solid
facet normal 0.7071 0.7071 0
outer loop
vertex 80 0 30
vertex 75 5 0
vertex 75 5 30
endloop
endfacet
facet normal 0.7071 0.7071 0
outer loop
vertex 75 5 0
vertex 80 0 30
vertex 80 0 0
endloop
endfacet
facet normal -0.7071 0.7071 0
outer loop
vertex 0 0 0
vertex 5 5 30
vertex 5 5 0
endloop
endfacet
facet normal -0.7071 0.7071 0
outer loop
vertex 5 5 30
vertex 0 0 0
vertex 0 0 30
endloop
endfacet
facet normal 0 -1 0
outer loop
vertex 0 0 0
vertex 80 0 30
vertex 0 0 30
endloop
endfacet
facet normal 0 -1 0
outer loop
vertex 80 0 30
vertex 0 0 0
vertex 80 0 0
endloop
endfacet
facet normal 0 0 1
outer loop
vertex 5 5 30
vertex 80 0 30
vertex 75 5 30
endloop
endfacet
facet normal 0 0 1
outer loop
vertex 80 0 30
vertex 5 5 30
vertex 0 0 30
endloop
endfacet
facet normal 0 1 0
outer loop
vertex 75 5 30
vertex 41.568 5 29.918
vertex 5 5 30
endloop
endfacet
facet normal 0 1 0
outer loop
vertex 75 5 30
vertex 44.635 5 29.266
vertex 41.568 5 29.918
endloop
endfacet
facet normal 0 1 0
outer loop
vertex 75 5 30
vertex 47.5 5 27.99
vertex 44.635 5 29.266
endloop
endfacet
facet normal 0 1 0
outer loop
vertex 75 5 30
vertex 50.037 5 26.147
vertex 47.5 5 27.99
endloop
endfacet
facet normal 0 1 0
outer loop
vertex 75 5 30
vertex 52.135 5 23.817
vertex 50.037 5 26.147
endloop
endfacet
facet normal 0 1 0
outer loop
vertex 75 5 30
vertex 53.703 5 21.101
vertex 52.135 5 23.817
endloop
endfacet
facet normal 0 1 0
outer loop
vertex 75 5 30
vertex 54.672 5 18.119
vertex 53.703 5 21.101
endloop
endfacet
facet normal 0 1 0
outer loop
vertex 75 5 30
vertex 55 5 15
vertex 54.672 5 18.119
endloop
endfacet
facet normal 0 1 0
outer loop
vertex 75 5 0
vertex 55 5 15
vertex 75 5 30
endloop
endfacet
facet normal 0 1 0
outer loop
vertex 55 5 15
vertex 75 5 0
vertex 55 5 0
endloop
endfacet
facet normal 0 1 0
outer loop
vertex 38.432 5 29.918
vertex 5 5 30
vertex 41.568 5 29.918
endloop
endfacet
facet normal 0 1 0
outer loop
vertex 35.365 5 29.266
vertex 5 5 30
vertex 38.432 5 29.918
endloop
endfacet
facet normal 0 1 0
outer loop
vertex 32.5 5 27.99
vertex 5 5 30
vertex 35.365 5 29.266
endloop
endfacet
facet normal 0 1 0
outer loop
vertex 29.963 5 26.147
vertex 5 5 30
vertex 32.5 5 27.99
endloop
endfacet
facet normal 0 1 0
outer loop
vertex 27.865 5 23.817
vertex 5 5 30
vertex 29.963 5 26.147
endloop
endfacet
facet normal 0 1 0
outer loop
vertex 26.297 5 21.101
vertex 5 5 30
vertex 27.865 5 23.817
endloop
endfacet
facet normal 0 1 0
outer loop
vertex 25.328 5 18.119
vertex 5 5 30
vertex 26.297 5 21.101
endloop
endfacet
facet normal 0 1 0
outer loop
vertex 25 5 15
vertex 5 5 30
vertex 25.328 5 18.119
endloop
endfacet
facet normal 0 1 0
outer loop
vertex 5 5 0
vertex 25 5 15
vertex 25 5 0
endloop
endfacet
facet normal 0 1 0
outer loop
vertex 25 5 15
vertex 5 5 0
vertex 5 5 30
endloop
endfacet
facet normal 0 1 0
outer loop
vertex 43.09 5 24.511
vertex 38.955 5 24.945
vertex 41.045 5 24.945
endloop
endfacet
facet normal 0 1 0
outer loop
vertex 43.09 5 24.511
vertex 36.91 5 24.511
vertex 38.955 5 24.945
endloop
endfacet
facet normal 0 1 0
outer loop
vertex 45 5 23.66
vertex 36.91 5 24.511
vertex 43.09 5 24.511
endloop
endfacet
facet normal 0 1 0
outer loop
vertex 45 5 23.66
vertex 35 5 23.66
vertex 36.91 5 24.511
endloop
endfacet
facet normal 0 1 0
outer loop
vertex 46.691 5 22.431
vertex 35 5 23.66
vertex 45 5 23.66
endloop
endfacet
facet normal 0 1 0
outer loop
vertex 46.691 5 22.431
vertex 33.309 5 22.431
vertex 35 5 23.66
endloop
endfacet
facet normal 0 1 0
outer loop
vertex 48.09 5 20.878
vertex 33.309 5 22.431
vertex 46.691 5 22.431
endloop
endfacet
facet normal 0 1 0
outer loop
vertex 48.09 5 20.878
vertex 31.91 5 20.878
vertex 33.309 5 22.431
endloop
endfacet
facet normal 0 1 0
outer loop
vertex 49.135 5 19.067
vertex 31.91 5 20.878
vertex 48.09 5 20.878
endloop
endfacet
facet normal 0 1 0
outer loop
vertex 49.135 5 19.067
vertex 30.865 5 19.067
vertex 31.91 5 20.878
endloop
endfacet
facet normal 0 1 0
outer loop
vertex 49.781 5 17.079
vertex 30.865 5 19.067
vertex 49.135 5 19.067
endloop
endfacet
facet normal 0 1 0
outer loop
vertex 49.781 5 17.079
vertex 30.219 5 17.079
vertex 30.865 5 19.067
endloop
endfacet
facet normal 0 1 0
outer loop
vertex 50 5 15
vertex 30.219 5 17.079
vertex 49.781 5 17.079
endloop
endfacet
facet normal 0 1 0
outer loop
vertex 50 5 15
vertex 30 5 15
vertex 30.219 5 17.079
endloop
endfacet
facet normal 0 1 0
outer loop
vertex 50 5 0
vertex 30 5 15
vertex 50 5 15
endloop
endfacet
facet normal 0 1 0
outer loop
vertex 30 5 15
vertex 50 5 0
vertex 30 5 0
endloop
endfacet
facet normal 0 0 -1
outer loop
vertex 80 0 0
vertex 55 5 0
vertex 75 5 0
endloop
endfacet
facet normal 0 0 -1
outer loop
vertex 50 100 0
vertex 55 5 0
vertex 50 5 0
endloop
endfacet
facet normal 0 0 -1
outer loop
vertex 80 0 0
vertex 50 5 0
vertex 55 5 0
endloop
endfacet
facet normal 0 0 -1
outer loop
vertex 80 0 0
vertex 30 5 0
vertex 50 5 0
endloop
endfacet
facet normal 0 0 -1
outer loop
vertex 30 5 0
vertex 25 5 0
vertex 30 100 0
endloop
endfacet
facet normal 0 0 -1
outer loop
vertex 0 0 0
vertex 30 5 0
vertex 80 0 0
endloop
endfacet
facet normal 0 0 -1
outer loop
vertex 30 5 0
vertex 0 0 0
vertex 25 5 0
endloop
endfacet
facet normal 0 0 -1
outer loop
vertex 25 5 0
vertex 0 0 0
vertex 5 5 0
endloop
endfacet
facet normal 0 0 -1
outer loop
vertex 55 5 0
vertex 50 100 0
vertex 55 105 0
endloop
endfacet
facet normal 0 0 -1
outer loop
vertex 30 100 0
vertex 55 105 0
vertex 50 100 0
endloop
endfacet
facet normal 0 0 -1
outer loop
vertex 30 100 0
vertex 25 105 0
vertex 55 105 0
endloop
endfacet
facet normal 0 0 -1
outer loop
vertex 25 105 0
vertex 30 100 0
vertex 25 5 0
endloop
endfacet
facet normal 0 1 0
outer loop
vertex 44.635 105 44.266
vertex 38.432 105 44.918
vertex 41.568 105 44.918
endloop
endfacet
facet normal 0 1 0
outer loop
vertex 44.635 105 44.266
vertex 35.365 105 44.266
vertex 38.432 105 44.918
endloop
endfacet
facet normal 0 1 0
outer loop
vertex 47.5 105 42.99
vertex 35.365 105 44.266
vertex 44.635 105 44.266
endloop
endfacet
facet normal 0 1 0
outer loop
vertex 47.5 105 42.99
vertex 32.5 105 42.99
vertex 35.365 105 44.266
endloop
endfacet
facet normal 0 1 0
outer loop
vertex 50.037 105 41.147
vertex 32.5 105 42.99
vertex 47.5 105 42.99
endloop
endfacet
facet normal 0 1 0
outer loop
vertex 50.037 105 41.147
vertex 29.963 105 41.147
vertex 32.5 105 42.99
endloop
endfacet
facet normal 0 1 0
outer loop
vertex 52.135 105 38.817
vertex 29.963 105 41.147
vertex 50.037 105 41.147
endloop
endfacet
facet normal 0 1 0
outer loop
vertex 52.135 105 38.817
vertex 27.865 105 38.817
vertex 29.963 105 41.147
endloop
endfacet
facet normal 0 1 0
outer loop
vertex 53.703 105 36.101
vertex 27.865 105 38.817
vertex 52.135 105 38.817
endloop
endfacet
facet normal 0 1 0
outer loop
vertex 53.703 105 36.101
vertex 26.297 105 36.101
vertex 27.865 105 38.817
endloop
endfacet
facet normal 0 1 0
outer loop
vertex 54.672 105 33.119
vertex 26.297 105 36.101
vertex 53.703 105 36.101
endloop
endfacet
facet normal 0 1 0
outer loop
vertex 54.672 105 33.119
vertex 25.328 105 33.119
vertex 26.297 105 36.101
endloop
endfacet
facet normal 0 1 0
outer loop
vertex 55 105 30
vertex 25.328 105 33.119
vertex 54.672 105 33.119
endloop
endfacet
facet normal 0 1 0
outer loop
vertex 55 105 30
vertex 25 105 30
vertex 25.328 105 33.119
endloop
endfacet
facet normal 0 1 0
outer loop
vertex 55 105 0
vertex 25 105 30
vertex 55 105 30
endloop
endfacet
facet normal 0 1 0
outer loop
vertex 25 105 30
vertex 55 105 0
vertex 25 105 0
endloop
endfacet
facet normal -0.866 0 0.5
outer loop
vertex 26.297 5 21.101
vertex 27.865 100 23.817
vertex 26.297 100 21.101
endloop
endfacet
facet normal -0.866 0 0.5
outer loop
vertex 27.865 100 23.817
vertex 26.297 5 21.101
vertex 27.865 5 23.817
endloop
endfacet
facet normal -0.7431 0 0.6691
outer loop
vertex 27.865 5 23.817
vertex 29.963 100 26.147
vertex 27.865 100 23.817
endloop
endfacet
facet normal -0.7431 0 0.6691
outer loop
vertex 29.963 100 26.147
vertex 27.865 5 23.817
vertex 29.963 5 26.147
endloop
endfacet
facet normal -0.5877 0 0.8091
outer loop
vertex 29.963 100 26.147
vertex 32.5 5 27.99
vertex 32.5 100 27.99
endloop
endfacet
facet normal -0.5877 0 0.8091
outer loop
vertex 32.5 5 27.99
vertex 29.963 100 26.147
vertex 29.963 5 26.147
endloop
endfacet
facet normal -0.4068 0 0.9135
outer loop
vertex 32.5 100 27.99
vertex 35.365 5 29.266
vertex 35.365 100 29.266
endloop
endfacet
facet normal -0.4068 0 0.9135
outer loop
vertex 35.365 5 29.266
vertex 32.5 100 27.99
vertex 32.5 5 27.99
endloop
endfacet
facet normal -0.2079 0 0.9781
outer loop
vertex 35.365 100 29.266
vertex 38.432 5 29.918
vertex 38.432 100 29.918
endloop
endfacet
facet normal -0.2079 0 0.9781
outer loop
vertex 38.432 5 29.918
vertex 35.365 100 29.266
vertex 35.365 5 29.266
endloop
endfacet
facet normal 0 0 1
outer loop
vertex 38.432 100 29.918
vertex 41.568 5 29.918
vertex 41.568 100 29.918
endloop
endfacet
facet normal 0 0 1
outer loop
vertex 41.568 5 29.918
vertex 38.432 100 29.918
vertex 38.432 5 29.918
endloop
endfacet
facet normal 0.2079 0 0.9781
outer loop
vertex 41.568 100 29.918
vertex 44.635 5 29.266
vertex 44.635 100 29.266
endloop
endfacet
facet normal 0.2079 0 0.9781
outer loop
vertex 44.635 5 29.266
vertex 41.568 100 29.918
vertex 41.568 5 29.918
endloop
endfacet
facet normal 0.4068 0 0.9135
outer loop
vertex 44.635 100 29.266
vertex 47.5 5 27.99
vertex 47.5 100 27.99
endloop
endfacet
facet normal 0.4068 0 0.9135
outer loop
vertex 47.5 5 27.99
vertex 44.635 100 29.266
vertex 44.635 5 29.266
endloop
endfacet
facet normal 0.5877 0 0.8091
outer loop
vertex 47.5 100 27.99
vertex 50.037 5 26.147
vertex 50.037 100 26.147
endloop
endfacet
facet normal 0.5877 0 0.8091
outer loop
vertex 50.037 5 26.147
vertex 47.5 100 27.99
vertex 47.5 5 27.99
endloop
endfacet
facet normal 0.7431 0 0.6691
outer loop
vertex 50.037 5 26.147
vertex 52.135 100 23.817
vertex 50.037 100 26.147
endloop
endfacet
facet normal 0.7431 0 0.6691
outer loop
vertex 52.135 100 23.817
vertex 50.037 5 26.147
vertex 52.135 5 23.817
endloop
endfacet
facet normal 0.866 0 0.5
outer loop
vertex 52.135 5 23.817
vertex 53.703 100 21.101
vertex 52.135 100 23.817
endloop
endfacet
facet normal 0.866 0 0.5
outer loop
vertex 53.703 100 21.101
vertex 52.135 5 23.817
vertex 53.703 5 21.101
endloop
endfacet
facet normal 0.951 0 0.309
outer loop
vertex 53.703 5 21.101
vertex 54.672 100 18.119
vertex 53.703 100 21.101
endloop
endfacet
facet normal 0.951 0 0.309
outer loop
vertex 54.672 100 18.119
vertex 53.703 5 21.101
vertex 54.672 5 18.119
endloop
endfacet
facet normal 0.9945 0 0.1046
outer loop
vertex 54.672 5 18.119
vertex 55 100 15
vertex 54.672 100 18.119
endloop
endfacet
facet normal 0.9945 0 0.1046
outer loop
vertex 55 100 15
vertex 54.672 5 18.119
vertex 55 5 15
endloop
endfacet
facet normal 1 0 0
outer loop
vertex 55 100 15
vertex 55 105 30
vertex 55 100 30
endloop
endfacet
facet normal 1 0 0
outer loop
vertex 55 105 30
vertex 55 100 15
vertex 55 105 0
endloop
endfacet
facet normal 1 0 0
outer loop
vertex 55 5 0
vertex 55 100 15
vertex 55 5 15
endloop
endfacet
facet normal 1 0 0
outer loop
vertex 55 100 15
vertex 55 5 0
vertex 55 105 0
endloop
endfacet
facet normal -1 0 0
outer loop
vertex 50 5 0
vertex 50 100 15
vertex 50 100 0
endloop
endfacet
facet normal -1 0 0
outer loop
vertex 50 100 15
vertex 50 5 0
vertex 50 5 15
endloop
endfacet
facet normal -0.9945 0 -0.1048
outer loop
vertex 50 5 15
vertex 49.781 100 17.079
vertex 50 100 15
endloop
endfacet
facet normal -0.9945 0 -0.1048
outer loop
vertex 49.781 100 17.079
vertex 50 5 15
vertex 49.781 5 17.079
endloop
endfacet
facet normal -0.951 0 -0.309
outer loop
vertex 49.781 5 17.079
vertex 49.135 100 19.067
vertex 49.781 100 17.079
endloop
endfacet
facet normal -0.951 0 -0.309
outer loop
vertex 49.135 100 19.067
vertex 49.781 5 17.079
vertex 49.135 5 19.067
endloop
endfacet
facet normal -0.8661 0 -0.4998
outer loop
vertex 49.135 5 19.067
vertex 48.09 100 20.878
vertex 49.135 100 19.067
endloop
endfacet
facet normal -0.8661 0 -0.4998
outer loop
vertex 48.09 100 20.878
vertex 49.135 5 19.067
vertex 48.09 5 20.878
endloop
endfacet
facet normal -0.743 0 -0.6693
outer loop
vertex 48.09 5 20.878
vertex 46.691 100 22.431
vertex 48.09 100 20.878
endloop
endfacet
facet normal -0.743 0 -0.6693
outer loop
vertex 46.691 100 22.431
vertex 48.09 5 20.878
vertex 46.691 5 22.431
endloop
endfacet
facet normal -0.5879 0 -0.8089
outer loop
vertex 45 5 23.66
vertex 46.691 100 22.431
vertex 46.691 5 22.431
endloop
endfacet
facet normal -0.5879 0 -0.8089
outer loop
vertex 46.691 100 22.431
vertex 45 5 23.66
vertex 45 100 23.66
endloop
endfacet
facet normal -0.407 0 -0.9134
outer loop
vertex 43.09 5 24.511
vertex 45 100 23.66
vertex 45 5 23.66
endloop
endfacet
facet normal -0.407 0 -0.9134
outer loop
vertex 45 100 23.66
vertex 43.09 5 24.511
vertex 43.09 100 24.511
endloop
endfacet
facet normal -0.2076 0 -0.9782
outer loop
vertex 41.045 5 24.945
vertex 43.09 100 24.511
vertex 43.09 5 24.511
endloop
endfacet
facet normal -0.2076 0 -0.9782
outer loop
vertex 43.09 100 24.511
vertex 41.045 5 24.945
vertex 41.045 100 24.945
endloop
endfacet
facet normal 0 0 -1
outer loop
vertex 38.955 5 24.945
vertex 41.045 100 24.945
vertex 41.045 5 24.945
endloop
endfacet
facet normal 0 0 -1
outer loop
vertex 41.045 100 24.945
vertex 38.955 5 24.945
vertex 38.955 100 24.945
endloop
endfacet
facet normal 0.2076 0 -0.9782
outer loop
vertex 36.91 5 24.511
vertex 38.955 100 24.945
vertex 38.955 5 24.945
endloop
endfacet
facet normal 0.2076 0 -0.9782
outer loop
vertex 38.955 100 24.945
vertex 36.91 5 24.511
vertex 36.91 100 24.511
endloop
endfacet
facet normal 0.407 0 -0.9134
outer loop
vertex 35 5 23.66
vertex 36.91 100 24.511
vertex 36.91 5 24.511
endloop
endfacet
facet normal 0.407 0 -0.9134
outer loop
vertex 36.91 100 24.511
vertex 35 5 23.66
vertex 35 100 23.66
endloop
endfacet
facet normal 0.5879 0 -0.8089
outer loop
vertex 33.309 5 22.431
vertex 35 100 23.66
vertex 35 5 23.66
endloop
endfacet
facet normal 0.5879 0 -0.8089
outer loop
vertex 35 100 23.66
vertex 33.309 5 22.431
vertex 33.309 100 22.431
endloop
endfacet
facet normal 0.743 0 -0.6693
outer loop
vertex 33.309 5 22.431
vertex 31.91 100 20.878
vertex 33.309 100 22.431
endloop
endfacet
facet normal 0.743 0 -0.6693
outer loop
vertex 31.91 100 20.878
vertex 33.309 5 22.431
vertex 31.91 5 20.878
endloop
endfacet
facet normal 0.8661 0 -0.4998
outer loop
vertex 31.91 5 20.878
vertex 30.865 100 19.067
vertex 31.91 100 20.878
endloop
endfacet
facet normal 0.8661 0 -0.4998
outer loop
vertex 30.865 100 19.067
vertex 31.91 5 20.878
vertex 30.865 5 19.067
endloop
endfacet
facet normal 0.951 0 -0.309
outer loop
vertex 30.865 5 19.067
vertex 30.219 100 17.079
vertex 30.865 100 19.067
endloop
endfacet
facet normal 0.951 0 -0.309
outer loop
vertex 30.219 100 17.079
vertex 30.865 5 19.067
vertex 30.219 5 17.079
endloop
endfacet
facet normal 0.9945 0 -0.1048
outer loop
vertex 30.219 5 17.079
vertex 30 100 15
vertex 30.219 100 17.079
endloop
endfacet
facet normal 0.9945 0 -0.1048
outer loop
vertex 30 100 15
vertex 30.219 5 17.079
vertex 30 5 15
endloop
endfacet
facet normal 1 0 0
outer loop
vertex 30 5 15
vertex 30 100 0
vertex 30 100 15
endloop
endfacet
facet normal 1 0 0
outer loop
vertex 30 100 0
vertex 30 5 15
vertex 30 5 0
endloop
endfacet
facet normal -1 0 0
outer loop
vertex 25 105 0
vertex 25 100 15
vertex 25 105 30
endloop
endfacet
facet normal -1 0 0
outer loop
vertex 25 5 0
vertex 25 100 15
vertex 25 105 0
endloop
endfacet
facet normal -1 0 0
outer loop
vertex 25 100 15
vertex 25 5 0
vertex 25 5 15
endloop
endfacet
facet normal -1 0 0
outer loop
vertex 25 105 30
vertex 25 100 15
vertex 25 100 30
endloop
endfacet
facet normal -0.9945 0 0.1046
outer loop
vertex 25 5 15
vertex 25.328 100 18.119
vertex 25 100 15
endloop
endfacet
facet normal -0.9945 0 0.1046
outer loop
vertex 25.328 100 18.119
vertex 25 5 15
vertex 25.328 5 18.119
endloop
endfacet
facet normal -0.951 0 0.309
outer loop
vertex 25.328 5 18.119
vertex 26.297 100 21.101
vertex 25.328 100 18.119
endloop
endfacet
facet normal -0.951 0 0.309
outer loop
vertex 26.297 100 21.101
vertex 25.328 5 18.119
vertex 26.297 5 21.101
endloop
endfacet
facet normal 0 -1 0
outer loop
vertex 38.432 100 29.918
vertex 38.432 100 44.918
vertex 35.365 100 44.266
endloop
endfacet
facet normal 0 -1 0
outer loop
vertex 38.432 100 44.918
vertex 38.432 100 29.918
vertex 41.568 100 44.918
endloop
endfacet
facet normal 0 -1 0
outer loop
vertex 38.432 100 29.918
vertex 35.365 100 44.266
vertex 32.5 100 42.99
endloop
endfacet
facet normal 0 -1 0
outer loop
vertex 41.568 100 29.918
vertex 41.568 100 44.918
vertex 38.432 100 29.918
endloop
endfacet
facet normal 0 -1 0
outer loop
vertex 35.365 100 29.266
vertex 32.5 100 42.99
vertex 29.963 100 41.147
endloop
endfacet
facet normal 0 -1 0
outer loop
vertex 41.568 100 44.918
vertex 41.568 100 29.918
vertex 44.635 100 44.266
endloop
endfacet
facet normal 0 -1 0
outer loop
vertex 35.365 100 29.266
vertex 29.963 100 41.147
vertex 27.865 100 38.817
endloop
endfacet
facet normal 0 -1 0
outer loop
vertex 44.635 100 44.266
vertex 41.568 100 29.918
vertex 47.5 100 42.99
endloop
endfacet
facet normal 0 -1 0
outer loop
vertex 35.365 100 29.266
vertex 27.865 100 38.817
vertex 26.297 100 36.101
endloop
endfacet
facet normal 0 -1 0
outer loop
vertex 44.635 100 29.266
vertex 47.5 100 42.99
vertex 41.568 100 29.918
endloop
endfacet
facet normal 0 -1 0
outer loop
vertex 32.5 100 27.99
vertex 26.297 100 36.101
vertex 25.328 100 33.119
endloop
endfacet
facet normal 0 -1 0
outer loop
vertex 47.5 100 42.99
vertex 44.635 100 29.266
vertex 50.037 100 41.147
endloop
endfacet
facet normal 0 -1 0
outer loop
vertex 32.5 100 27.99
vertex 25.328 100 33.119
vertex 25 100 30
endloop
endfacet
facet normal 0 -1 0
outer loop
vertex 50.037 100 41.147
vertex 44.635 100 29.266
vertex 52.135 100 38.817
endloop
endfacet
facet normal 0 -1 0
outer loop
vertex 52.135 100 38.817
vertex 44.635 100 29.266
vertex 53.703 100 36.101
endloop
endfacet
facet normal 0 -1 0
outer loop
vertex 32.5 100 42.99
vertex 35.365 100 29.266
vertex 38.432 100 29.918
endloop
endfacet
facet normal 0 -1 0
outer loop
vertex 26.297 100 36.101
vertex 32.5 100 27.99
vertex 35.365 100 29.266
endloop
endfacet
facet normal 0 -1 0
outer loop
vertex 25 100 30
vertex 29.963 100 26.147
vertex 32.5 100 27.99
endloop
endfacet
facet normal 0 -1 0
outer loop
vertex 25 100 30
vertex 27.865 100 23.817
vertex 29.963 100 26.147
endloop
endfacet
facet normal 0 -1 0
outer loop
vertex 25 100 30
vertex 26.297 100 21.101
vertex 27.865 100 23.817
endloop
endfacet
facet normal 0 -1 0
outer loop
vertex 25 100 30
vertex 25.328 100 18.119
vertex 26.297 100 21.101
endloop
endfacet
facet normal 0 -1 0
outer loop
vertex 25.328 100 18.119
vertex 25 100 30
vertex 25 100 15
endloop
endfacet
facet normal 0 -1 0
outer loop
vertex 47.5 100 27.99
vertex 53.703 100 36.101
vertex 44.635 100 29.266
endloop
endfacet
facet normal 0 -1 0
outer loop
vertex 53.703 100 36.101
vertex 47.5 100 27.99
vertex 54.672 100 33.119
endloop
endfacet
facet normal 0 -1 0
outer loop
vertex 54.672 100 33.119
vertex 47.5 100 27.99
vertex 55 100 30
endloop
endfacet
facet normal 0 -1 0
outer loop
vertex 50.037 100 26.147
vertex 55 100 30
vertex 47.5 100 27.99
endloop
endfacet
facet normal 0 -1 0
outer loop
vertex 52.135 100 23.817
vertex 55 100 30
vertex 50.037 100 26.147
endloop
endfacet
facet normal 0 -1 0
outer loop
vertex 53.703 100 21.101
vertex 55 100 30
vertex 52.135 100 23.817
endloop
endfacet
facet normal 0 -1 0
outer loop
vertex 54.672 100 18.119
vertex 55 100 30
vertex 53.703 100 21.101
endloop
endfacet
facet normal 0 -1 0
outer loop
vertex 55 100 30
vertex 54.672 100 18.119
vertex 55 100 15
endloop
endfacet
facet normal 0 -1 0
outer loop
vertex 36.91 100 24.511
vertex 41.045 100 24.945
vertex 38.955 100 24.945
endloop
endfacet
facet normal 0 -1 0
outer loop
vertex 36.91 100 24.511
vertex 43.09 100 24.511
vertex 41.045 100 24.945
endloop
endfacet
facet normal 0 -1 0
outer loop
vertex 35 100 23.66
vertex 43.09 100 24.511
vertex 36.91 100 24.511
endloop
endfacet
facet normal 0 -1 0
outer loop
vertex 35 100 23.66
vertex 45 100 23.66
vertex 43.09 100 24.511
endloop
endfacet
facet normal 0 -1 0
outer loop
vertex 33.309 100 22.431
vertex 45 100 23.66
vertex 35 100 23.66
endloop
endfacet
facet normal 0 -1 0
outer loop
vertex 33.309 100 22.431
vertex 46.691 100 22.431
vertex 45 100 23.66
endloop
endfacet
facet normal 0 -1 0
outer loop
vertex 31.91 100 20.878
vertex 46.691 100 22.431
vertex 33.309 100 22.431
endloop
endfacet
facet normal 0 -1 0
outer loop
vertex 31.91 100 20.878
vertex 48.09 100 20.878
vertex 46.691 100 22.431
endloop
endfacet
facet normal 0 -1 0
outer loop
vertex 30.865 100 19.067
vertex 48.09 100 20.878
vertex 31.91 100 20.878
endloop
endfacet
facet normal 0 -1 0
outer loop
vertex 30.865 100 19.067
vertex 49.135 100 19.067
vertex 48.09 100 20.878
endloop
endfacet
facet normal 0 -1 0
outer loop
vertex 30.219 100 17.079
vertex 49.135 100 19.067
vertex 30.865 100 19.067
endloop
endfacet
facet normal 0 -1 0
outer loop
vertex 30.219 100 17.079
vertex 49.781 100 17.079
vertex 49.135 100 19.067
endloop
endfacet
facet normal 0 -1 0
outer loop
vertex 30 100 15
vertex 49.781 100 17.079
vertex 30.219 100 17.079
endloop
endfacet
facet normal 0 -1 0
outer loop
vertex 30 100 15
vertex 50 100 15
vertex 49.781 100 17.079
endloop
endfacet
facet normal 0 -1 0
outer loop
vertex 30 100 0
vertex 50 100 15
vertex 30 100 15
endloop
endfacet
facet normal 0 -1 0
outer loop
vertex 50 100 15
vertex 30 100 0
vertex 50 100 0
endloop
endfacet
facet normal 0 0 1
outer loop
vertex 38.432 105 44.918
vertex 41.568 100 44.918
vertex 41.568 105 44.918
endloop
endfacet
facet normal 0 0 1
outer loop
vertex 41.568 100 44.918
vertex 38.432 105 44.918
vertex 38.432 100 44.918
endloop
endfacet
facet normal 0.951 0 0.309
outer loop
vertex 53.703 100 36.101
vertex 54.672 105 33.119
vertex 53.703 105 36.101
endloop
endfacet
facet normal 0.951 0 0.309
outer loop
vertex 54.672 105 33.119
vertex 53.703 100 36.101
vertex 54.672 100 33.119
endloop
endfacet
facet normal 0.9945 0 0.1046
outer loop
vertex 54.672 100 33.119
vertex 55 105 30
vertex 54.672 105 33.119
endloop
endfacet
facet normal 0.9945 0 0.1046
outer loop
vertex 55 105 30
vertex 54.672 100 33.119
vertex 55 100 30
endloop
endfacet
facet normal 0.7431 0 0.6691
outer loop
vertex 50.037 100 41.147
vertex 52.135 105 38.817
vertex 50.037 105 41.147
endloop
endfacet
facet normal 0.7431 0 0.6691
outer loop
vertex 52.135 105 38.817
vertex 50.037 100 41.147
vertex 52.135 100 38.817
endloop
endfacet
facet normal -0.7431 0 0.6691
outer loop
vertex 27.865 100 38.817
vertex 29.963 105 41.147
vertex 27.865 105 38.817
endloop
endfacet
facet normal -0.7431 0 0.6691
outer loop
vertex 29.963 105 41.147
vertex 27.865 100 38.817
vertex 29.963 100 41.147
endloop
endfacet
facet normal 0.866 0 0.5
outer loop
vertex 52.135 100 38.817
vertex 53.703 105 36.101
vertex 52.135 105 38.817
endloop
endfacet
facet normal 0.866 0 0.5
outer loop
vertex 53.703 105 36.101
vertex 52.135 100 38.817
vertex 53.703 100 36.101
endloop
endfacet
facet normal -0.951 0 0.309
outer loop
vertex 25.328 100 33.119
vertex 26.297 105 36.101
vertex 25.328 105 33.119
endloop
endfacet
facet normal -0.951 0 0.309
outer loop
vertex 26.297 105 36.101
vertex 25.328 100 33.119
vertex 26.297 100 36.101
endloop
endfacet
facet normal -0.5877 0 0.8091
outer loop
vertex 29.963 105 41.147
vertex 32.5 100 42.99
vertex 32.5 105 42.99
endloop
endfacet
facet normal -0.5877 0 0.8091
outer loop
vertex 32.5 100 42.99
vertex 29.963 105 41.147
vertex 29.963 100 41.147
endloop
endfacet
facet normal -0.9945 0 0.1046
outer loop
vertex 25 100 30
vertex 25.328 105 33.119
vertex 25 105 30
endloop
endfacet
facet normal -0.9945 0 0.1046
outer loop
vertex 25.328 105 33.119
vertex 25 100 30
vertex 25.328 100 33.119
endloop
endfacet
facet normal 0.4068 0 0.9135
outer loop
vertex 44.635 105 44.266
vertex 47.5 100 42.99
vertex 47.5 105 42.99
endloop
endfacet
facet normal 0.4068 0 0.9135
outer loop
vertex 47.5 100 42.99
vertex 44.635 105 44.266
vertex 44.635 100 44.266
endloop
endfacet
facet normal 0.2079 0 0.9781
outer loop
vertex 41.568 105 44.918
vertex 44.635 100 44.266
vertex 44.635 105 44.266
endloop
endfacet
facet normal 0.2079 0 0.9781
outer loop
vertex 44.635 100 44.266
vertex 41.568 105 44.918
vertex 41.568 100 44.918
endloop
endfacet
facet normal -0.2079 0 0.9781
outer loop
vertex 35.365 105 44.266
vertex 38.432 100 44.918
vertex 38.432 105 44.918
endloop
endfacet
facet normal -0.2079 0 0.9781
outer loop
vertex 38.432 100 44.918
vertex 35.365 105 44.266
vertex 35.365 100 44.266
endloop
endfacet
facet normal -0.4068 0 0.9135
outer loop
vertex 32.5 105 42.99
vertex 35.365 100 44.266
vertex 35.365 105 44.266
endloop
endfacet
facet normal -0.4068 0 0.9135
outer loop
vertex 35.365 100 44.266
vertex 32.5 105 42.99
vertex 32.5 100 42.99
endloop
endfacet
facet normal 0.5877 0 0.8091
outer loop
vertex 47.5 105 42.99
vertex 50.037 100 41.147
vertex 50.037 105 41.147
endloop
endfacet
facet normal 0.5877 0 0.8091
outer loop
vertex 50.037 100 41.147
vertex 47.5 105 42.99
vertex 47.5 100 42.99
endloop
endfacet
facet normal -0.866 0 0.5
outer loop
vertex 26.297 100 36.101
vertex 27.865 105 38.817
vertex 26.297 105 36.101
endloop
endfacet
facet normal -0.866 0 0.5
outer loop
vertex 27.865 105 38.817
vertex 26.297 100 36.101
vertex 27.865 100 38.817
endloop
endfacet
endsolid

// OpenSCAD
base_width = 80;
thickness = 30;
wall_thickness = 5;
length = 100;

//circle([50, 100]);


module base(width, height, wall_thickness) {
	linear_extrude (height) {
	polygon(
		[
			[0, 0],
			[width, 0],
			[width - wall_thickness, wall_thickness],
			[wall_thickness, wall_thickness]
		],
		[[0, 1, 2, 3]]
	);
	}
}


module half_tube(length, width, wall_thickness) {
	rotate([-90, 0, 0]) linear_extrude (length) {
	difference () {
		circle(width / 2);
		circle(width / 2 - wall_thickness);
		
		translate([-(width / 2), 0]) square([thickness * 2, thickness]);
	}
	
	translate([(width / 2) - wall_thickness, 0]) square([wall_thickness, width / 2]);
	translate([-(width / 2), 0]) square([wall_thickness, width / 2]);
	}
}

base(base_width, thickness, wall_thickness);
translate([base_width / 2, wall_thickness, thickness / 2]) half_tube(length, thickness, wall_thickness);

translate([base_width / 2 - (thickness / 2), length, 0]) cube([thickness, wall_thickness, thickness]);
translate([base_width / 2, length + wall_thickness, thickness]) rotate([90, 0, 0]) cylinder(wall_thickness, thickness / 2, thickness / 2);
